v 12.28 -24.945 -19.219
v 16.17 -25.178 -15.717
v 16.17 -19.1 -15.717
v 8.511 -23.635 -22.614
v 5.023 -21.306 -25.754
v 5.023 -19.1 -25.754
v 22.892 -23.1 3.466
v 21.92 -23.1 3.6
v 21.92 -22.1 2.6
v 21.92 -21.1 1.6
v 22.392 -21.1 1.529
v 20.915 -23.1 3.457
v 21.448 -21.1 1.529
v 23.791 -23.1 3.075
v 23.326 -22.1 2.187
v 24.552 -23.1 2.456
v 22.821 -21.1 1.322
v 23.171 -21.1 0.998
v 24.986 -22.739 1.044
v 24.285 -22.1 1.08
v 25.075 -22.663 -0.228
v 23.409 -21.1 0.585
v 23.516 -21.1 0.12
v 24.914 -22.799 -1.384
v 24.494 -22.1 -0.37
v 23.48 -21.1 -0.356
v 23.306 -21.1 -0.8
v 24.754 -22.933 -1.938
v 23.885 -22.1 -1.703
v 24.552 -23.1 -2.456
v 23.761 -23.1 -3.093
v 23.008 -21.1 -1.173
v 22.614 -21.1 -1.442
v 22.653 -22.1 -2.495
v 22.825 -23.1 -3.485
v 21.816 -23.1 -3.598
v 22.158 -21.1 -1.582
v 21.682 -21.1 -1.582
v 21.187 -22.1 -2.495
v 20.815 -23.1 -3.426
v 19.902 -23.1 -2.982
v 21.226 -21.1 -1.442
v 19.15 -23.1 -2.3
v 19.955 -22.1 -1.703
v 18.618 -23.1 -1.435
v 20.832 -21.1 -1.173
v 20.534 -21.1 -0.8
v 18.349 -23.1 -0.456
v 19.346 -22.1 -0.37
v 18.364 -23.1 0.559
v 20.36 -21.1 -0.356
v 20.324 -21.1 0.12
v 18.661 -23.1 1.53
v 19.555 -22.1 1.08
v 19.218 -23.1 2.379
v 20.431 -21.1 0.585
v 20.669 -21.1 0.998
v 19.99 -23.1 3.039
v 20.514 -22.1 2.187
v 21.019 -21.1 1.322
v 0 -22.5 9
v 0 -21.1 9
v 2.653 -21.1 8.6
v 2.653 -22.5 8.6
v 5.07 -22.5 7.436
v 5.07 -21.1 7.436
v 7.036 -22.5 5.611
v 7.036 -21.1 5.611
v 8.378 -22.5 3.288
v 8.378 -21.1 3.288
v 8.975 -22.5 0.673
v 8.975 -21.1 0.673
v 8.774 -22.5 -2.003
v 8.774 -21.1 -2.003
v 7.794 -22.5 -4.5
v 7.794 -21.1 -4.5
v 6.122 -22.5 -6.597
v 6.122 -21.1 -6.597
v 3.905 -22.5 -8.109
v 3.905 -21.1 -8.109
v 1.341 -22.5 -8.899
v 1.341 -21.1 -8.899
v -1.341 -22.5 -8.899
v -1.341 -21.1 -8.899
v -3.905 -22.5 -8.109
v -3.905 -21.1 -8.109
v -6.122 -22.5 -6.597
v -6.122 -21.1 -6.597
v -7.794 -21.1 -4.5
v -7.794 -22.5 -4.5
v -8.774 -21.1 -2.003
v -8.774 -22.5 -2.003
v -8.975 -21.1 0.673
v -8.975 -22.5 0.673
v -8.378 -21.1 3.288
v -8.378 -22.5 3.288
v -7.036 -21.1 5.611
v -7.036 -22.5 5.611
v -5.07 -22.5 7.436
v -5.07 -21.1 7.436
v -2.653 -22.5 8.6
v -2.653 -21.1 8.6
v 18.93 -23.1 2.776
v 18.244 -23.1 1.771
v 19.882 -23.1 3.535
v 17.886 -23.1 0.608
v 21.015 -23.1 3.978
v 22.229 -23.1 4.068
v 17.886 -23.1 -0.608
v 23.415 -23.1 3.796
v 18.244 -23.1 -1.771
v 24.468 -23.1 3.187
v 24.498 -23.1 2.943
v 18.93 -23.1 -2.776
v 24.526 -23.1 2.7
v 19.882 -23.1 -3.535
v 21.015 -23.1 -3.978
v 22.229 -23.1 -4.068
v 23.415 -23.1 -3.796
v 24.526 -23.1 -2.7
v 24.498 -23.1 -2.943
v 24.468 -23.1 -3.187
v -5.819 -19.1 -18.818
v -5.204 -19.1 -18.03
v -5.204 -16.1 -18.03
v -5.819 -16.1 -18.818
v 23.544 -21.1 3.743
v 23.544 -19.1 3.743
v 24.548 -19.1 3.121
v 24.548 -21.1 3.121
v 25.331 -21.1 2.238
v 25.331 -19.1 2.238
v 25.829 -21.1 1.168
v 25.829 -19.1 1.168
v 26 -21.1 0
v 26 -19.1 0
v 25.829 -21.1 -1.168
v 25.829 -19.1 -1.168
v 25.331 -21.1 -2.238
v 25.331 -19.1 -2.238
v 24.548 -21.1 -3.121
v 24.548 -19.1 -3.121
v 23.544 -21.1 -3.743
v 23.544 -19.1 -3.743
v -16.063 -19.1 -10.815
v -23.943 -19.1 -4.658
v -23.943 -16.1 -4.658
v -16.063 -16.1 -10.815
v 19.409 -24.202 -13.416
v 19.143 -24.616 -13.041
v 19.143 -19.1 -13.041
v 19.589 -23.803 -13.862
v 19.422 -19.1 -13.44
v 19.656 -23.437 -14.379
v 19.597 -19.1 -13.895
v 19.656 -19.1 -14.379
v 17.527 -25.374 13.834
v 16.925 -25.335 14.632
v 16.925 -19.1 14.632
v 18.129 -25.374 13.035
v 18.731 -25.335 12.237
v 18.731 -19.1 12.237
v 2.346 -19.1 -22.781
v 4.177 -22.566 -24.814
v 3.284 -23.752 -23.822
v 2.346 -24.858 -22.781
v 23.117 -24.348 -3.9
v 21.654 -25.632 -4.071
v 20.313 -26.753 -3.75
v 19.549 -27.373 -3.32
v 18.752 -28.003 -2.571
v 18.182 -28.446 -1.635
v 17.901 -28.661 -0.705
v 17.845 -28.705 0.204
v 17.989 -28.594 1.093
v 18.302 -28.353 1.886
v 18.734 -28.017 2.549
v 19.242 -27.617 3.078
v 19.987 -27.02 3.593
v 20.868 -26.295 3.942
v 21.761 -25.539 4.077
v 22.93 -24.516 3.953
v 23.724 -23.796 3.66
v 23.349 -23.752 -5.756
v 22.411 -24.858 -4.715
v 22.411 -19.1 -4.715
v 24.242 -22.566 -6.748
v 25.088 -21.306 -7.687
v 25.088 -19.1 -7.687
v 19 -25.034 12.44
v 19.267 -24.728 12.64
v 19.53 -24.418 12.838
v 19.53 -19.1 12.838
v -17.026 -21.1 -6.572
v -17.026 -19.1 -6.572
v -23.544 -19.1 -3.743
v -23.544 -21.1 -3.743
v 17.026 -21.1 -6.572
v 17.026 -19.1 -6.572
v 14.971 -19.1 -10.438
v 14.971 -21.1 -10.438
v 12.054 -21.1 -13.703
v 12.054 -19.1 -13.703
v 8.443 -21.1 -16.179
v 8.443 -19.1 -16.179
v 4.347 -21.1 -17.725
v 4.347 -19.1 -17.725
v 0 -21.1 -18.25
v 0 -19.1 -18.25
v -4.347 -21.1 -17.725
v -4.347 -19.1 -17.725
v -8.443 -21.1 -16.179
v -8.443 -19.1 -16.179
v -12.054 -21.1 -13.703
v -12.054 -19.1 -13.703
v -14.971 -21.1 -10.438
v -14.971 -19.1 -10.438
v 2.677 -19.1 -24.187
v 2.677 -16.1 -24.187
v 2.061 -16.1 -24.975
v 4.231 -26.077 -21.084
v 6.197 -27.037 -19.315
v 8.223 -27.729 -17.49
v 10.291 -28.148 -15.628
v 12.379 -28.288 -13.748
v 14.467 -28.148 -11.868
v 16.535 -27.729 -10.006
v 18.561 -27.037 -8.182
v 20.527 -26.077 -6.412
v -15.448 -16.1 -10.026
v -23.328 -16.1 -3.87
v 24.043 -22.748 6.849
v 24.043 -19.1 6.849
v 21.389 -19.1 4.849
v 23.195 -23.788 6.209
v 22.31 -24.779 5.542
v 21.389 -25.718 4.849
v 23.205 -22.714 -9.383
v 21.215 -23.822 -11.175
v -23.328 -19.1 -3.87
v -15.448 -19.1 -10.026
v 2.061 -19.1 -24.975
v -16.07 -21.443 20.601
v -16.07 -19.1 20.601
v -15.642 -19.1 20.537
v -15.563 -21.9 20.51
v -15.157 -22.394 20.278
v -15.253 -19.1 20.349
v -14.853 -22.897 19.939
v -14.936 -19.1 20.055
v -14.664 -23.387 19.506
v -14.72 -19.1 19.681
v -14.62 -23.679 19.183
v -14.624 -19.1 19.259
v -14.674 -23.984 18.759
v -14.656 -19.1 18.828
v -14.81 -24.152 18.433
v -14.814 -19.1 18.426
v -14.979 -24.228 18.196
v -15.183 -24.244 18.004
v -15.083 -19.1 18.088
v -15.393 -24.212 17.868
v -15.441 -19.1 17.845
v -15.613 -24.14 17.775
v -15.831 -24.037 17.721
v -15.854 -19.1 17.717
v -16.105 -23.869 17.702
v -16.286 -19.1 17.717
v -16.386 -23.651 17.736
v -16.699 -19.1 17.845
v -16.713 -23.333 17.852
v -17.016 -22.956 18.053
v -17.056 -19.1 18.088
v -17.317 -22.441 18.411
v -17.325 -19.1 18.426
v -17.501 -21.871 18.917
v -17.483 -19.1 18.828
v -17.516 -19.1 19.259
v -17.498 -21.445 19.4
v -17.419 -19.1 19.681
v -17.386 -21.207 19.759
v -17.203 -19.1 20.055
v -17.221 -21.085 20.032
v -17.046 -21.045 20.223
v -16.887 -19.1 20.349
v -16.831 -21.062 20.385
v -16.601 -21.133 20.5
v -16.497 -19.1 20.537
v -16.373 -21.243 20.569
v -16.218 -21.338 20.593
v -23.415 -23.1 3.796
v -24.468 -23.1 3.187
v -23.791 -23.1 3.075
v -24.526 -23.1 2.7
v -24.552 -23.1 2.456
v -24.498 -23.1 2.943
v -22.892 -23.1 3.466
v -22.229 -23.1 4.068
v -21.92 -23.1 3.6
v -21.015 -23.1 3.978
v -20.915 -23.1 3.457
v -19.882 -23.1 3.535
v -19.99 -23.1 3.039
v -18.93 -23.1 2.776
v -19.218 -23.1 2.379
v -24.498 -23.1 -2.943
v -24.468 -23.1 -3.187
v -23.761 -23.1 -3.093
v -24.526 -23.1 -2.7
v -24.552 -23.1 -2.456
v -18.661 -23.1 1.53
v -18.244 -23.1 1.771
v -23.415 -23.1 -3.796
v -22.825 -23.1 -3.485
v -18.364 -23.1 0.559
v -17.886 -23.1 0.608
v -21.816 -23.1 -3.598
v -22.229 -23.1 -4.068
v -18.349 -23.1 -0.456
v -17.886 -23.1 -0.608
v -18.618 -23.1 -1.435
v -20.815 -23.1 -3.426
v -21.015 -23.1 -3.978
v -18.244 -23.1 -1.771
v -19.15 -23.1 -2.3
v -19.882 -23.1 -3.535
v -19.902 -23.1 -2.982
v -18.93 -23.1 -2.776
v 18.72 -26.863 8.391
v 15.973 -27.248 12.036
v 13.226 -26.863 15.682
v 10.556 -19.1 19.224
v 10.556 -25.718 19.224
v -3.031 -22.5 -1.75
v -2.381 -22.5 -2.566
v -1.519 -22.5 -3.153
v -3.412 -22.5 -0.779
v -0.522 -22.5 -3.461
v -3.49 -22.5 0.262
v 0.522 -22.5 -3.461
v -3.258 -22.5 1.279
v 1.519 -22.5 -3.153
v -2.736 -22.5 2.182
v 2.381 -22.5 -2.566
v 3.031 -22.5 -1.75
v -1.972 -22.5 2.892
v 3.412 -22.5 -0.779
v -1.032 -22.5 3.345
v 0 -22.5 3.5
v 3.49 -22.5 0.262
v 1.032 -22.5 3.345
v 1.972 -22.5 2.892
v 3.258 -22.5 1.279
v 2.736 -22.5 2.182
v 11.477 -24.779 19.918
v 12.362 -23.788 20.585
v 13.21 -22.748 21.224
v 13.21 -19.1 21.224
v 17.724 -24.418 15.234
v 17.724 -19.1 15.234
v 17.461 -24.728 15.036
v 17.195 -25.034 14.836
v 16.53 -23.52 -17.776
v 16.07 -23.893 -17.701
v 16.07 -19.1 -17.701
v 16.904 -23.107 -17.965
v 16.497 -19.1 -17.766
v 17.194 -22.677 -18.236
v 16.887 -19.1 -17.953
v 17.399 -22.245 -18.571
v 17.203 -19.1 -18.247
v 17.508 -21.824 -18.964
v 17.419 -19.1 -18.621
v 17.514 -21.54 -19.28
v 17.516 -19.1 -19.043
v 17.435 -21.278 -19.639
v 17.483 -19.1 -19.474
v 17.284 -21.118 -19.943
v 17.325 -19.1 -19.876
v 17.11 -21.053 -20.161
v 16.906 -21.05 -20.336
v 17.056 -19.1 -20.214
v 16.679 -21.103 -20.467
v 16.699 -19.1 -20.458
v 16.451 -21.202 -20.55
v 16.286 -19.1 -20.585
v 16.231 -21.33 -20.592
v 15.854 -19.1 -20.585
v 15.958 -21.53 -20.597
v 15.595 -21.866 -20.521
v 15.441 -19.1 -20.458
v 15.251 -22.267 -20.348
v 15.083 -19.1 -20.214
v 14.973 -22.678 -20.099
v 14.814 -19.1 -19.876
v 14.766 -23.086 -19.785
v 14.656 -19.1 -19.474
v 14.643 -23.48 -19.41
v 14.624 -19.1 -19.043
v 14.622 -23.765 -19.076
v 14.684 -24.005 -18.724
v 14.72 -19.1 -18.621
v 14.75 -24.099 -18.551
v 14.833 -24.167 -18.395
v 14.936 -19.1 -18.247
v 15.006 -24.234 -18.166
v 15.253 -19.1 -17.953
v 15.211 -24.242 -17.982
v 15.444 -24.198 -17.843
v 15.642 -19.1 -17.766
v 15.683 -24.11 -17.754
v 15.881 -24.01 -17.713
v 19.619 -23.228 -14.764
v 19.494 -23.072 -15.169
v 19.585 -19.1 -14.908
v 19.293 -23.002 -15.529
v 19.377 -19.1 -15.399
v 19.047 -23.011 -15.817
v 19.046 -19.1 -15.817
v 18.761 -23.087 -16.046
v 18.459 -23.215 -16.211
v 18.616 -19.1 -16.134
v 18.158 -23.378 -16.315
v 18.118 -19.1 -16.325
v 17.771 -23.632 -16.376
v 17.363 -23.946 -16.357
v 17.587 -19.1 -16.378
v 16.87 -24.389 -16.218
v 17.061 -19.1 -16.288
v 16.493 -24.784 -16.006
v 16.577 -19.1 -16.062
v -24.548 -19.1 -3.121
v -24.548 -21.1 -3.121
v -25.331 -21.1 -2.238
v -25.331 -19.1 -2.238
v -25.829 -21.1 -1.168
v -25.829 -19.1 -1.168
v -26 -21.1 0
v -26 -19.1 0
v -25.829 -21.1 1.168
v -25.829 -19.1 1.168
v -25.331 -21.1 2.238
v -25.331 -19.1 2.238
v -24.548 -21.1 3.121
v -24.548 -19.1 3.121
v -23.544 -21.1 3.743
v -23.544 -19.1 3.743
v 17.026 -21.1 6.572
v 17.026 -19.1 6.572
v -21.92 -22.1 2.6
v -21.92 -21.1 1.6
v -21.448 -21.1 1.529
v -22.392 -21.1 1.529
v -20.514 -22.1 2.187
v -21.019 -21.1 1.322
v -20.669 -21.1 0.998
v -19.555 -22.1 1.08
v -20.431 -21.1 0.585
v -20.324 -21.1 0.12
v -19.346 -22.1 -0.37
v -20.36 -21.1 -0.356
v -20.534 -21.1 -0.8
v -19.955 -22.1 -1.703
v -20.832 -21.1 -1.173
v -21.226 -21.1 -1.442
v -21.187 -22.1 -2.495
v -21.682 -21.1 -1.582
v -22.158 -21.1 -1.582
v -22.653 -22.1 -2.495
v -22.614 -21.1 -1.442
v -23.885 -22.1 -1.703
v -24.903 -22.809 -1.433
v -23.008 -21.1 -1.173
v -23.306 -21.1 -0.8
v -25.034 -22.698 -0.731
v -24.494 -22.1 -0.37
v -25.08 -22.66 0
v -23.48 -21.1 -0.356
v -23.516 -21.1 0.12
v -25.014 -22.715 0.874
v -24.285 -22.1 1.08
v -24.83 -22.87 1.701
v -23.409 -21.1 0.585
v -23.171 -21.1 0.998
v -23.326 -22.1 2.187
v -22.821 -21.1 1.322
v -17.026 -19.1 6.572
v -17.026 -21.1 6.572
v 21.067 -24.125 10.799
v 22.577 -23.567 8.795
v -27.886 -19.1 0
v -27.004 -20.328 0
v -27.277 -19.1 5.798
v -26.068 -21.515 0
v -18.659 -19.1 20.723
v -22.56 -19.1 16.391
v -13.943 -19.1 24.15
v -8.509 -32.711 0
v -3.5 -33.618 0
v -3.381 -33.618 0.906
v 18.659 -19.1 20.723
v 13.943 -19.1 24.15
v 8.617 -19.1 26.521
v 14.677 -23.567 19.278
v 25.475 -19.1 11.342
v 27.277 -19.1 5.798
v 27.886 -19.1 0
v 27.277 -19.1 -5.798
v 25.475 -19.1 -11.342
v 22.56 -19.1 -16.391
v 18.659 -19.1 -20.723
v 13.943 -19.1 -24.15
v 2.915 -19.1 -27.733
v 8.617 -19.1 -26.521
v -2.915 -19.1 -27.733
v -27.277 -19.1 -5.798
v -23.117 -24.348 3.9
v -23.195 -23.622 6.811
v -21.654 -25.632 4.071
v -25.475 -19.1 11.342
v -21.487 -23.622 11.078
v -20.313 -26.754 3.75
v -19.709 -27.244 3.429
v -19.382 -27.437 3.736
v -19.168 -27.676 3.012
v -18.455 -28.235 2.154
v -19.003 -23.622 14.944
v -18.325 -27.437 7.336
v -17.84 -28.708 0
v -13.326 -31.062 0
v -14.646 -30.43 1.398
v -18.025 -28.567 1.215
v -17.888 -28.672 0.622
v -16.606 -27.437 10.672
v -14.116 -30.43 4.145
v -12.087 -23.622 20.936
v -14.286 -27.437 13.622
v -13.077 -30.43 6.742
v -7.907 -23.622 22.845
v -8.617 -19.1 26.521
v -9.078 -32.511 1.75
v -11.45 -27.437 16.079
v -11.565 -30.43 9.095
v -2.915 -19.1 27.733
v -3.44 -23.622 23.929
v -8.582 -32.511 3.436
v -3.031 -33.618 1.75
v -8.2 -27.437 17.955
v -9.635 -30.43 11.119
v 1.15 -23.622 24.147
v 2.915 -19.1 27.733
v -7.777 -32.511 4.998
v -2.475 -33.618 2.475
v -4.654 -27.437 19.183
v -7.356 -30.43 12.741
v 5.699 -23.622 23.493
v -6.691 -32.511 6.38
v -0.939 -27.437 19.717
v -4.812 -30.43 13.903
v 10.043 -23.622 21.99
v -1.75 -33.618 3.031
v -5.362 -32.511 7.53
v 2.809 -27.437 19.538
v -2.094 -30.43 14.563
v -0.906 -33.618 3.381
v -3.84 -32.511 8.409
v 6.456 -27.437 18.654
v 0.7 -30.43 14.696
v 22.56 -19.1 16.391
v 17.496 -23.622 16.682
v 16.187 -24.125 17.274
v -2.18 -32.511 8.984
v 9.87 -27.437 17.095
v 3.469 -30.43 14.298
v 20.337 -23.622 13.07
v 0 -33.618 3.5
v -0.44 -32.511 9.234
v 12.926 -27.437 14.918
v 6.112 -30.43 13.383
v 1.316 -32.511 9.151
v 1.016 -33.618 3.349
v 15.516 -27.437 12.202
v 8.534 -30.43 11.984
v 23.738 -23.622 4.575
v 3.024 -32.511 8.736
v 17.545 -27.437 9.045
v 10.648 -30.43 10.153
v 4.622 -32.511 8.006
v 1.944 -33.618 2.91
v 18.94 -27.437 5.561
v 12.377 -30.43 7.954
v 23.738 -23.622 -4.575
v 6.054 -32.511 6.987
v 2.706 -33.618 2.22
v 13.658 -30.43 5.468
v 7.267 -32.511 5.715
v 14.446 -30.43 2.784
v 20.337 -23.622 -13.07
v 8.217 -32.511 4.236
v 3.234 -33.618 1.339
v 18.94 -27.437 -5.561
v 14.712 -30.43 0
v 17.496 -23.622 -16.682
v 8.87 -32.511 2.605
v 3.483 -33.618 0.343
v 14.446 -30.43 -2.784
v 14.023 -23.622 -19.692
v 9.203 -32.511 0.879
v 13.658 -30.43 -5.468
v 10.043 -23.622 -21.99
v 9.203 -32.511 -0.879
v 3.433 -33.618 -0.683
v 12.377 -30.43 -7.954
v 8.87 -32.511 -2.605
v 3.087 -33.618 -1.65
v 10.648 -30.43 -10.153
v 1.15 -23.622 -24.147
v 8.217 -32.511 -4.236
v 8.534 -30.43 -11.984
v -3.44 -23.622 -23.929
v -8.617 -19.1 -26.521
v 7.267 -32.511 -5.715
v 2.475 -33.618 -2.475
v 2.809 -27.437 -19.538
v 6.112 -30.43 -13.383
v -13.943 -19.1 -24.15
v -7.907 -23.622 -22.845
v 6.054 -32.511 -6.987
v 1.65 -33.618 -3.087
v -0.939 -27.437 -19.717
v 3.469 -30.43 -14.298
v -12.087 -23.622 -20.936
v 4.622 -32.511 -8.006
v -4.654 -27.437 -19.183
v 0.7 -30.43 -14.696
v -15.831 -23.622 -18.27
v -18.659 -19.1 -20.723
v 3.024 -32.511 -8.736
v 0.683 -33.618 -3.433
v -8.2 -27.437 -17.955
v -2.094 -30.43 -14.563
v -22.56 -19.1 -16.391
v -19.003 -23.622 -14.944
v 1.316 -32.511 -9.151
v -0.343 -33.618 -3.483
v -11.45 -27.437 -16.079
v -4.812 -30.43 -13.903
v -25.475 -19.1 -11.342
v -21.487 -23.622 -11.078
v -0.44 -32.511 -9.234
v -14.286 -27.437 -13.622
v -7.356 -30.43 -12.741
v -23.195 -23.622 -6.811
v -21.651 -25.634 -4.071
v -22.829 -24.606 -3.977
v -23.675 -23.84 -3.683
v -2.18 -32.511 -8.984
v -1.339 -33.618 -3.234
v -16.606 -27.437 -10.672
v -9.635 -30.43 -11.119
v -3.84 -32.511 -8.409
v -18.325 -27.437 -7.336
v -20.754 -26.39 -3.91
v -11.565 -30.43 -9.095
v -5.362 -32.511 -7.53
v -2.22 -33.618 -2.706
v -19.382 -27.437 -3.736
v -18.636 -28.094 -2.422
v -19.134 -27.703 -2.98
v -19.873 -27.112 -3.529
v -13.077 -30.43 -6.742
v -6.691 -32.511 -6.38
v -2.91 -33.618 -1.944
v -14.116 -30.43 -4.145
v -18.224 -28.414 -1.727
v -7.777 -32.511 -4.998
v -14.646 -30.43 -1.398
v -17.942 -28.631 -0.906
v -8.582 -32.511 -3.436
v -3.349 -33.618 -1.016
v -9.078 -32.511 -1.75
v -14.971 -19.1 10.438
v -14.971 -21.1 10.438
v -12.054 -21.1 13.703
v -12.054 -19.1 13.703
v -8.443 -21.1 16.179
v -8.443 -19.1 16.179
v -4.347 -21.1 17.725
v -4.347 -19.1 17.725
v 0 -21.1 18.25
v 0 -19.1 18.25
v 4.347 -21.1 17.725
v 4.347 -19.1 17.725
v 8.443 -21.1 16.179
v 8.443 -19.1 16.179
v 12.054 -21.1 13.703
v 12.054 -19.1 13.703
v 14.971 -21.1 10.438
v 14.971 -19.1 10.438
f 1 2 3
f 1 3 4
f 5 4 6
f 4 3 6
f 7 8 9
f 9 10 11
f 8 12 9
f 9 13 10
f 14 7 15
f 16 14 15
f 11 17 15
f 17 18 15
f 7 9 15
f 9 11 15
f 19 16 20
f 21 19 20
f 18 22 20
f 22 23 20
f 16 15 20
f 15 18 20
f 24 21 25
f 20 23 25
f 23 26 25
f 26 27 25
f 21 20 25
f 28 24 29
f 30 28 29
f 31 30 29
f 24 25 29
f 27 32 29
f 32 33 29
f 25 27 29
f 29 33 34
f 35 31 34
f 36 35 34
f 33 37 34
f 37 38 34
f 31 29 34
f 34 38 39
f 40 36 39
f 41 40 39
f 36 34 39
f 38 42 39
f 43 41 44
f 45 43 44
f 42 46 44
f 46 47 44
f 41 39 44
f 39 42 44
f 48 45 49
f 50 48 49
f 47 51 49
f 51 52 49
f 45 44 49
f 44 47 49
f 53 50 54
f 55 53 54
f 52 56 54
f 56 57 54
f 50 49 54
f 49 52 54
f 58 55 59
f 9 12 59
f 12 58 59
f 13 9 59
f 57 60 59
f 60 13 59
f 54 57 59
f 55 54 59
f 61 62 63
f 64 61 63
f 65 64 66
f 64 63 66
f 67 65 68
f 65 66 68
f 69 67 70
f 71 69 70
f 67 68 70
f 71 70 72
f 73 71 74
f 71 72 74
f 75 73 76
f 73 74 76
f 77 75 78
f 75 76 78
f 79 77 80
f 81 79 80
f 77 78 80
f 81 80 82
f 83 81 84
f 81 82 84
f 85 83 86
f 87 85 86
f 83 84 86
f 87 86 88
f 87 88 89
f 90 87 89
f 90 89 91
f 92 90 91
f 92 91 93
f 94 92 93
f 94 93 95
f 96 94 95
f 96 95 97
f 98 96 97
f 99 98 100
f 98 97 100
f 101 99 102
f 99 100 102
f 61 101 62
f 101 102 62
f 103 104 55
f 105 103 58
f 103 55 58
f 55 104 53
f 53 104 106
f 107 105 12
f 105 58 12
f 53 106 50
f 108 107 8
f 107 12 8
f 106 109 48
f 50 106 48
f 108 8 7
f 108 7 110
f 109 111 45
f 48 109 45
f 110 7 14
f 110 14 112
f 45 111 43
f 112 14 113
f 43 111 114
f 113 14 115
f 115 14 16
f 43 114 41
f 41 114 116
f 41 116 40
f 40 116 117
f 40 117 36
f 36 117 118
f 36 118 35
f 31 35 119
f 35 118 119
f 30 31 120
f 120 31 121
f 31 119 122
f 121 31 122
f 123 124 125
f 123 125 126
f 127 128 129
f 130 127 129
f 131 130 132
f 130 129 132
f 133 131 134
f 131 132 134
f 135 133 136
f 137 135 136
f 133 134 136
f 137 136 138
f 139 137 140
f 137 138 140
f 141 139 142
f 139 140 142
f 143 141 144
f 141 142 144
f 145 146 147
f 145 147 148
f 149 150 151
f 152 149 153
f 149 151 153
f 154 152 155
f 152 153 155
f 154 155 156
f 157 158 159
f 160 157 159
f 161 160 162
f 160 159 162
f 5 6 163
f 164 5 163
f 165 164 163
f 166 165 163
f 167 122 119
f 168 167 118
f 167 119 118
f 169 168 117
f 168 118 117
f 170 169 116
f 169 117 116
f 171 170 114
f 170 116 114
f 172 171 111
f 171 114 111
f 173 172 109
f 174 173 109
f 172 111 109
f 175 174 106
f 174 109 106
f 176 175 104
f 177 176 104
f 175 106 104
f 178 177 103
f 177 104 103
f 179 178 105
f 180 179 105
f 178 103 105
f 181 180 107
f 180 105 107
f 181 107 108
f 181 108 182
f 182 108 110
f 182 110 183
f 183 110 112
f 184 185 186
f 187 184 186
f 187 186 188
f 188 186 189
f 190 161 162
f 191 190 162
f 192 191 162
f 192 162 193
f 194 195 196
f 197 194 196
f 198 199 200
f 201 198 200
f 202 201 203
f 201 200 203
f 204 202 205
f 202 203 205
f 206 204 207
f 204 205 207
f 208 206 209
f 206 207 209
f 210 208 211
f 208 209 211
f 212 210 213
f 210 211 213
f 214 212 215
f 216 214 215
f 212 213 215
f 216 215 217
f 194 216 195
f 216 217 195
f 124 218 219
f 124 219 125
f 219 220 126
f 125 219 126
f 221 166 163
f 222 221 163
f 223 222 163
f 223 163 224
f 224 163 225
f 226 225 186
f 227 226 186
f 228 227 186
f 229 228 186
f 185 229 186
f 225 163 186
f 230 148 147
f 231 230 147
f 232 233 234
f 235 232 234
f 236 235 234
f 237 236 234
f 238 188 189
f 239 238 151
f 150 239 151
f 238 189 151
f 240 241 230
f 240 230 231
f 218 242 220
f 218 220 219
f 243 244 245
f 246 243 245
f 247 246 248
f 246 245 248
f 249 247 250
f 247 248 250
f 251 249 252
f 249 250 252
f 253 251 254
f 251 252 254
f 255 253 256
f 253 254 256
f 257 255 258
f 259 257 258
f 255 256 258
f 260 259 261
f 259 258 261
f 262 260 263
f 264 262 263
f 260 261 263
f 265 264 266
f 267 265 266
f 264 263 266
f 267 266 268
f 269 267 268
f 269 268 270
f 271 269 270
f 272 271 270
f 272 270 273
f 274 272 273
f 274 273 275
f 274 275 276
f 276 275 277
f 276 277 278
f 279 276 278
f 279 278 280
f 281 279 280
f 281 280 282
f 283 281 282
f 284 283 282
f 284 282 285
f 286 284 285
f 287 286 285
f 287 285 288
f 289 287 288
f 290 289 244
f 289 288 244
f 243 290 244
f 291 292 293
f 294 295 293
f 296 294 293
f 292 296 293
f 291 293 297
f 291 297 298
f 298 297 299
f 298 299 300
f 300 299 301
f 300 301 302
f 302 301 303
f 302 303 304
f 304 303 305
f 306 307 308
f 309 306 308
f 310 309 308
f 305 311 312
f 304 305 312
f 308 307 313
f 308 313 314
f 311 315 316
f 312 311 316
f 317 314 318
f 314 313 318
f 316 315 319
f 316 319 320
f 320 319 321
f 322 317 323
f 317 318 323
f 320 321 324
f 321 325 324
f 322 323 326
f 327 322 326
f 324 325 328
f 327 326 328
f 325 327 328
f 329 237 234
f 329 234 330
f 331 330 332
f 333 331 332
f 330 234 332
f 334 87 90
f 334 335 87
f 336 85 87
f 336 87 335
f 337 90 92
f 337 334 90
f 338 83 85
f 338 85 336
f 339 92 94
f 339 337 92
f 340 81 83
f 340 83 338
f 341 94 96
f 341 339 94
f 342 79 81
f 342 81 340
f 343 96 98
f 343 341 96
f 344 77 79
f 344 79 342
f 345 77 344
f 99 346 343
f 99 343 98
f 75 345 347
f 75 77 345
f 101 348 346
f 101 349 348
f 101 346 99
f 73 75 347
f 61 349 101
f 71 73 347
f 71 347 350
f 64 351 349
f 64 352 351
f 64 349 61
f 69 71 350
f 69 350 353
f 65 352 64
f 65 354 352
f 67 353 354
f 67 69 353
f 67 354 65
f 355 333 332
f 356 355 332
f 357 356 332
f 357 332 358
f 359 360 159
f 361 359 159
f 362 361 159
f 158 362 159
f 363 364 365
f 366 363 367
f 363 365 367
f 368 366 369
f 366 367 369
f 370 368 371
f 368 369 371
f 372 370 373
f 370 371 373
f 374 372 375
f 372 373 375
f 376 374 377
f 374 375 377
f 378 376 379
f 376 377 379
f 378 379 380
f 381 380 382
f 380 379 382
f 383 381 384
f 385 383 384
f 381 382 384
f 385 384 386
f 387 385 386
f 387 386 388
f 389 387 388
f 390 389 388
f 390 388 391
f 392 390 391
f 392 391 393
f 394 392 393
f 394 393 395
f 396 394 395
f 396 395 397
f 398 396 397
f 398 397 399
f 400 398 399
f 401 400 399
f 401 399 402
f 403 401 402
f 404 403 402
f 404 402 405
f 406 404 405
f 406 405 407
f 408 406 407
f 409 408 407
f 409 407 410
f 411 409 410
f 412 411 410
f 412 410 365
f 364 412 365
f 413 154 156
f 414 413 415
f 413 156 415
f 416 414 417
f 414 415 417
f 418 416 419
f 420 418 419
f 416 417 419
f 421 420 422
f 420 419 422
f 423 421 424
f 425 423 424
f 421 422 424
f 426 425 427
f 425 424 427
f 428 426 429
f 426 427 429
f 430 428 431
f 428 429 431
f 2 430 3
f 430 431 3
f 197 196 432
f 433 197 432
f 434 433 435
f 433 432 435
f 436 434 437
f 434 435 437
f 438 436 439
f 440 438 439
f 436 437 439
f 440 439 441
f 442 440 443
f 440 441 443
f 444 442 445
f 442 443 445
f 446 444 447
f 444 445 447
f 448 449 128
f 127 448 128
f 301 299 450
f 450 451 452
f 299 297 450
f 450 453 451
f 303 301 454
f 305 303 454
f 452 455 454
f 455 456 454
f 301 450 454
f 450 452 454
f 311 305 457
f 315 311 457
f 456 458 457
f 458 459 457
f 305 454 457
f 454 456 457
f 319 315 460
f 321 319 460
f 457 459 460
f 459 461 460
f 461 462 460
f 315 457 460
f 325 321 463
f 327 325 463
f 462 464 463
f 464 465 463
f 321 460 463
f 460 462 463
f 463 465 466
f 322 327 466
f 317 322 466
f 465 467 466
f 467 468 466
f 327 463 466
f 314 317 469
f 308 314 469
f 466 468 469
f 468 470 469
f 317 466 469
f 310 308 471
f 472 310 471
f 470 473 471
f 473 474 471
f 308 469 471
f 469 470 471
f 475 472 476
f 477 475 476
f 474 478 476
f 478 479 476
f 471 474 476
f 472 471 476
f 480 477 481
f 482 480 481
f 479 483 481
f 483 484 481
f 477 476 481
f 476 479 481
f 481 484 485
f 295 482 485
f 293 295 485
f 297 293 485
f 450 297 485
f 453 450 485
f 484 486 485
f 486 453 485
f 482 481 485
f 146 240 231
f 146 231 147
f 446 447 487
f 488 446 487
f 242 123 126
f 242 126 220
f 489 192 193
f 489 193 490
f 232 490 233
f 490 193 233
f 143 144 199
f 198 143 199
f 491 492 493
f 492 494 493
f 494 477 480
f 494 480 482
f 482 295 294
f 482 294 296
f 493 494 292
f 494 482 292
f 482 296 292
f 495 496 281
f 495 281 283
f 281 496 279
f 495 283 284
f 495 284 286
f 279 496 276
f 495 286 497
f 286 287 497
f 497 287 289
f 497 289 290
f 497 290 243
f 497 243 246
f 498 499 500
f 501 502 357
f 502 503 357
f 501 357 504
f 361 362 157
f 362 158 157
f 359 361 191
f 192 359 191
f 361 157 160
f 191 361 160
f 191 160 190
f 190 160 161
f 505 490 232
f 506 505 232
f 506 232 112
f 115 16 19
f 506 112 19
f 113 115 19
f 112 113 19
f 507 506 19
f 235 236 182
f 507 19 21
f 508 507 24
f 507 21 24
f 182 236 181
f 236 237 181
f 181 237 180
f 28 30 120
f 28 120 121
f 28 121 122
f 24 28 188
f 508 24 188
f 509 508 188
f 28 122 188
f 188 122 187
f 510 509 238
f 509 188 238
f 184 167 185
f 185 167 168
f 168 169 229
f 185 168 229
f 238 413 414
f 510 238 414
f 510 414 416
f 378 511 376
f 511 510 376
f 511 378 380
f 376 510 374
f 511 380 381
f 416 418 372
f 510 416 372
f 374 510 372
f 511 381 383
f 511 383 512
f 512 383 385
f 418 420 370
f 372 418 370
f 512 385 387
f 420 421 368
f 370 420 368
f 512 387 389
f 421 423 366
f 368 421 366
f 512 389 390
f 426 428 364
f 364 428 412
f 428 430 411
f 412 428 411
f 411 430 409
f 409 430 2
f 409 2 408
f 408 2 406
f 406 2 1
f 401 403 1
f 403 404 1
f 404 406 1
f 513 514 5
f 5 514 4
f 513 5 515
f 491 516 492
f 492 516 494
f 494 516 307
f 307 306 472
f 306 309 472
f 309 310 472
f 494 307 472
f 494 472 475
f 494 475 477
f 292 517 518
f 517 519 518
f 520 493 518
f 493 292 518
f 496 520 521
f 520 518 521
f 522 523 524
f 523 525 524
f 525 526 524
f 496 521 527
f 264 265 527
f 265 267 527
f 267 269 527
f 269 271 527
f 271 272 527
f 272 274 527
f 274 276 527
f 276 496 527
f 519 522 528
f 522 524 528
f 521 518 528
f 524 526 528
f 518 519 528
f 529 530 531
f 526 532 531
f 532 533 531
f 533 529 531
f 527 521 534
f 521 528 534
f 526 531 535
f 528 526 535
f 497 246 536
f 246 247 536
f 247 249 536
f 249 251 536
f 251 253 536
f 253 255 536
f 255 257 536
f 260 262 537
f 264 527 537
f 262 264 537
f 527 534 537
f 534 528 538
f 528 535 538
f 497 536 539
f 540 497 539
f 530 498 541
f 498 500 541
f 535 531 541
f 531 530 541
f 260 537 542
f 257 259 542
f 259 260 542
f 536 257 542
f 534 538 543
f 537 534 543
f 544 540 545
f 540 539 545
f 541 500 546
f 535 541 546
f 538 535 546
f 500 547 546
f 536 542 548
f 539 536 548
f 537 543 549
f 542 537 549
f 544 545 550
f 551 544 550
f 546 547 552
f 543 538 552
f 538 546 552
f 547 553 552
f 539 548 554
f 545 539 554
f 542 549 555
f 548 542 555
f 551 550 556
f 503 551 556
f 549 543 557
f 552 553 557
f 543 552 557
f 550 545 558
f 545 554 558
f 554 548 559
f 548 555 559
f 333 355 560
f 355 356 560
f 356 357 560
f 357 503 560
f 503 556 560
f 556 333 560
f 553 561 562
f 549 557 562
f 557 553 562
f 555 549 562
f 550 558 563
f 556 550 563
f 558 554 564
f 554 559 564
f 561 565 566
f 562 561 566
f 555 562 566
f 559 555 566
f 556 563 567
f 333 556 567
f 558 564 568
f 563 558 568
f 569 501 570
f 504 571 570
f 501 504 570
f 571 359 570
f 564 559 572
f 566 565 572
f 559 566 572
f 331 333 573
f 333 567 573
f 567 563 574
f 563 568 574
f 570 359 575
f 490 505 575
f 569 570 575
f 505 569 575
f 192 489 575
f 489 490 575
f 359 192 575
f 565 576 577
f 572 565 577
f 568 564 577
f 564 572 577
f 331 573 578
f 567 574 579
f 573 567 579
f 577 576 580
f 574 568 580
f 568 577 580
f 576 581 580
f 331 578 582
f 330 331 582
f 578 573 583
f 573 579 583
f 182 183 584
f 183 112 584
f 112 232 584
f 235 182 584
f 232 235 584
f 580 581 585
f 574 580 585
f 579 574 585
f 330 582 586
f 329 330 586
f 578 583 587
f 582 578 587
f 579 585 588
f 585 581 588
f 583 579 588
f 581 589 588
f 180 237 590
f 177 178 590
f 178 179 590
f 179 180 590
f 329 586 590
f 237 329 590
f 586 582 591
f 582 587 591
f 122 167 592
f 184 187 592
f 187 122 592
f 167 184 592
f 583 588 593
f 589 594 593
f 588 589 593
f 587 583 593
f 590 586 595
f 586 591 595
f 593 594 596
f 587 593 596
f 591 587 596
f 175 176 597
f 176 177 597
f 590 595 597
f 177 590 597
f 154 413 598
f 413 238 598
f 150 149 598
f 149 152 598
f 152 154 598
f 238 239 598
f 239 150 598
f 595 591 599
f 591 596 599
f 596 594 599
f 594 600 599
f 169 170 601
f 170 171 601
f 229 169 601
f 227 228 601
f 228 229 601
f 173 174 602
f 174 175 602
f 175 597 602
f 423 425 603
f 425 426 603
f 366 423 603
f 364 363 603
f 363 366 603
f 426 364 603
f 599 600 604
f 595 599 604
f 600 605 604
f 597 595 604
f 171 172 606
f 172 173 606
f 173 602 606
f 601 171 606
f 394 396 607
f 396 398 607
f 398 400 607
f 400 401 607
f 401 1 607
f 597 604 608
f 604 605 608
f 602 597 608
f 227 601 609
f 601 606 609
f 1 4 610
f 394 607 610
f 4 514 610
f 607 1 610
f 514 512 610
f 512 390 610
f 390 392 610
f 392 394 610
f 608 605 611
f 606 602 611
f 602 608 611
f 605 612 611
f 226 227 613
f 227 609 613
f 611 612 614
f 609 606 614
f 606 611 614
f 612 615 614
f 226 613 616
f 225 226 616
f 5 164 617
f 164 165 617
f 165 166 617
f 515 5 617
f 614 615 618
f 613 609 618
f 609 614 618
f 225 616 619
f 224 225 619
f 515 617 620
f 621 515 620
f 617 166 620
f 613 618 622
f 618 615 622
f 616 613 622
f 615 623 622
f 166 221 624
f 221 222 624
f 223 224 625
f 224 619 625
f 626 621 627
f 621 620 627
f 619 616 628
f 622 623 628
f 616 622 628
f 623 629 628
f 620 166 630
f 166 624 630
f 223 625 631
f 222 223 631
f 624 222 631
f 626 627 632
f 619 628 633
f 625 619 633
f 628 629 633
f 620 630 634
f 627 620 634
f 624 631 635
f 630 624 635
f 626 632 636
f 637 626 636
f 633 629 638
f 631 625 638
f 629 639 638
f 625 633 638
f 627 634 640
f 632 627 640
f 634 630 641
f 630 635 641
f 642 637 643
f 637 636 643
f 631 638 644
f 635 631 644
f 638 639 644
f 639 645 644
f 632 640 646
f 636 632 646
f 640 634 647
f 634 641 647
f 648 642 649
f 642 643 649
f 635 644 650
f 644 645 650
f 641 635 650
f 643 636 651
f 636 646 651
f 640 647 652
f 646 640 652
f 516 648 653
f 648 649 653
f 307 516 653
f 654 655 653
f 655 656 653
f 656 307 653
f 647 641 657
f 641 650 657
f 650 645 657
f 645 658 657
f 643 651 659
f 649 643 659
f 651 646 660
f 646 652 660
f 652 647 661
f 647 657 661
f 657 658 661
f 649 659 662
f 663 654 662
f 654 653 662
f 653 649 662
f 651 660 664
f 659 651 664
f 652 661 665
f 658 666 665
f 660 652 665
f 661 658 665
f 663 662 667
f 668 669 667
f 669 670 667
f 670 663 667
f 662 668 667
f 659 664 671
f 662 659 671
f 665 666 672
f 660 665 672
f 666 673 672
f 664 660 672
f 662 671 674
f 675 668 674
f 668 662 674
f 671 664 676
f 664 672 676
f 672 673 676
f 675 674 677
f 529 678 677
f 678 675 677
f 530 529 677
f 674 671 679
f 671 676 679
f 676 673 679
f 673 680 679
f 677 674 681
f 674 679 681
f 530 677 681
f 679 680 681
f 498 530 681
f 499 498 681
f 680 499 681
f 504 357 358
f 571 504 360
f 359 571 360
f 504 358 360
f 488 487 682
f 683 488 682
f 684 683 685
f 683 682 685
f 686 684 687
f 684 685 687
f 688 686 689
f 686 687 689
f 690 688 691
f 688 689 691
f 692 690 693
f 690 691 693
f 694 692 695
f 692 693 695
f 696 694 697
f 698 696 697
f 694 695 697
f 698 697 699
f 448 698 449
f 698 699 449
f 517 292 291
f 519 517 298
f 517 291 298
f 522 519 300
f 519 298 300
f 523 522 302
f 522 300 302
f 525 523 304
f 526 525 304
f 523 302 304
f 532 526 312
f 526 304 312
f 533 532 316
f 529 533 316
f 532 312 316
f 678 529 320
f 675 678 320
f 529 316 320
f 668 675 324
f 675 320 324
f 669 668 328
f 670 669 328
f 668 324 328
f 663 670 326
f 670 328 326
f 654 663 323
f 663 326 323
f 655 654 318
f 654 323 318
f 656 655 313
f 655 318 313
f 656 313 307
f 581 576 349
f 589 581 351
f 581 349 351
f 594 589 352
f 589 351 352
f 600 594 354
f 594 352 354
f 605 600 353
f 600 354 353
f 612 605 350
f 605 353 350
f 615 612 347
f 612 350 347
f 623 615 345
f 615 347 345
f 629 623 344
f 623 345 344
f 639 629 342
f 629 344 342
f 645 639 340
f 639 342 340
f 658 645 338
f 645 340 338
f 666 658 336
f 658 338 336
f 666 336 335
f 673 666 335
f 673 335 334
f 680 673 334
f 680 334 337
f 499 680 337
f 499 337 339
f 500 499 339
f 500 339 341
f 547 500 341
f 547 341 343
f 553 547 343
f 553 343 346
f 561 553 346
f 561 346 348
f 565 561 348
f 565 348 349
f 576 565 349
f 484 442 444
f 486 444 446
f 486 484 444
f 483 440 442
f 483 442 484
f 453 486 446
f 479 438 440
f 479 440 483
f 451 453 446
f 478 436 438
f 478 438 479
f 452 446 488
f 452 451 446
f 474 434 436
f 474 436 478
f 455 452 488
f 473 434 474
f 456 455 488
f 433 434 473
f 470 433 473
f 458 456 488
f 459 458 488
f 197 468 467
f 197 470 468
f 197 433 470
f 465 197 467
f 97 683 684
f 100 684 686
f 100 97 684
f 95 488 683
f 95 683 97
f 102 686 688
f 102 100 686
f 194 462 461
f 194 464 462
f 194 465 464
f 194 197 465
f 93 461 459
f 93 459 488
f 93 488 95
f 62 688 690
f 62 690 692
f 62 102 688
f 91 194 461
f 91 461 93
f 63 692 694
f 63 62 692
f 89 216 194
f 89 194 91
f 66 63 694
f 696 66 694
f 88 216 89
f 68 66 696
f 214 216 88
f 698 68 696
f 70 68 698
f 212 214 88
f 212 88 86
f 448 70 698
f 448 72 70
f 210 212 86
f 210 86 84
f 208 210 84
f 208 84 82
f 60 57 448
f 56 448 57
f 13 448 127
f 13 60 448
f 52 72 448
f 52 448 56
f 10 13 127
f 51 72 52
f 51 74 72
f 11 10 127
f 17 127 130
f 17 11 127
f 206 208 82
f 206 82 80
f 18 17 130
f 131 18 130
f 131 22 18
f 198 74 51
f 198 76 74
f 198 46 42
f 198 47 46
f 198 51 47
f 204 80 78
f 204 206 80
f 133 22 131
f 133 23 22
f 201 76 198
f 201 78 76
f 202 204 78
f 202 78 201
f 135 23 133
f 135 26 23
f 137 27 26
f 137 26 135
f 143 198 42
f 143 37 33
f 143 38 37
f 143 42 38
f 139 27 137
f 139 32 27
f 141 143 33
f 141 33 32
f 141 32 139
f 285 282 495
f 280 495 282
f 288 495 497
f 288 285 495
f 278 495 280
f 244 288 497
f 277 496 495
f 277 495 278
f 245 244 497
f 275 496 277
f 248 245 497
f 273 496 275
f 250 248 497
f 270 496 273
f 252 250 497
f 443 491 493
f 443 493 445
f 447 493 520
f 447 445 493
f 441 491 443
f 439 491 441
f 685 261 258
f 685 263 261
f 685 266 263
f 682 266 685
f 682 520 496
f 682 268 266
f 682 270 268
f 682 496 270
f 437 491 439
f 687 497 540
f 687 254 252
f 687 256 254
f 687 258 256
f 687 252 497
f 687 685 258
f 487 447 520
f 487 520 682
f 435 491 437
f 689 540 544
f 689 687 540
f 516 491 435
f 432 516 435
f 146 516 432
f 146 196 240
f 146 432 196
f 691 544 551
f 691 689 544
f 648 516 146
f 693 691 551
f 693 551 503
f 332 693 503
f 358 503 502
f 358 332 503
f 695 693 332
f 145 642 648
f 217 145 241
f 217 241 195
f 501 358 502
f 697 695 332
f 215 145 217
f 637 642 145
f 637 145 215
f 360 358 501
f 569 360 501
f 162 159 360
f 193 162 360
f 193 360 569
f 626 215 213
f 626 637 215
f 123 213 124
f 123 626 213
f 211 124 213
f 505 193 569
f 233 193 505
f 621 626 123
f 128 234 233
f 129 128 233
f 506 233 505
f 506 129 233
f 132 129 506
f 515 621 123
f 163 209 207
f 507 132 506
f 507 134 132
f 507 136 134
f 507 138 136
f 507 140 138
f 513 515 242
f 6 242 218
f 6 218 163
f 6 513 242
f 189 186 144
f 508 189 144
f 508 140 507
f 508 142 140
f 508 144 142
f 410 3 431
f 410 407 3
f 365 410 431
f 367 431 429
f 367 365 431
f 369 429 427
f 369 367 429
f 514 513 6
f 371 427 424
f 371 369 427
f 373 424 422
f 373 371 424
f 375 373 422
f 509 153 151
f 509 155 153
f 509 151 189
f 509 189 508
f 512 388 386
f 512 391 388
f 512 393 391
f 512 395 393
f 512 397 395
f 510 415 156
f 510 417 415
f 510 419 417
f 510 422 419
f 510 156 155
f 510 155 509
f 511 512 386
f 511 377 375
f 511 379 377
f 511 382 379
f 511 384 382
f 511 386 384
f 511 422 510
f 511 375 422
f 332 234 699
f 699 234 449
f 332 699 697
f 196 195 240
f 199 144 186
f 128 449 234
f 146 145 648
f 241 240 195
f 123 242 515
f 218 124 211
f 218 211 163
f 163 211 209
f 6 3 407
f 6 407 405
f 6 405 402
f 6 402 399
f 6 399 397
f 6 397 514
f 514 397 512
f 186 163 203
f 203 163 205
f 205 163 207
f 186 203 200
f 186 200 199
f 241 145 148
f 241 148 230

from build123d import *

# Parameters (mm, degrees)
SKETCH2_R               = 33.8
CUT_EXTRUDE1_DEPTH      = 19.1
CUT_EXTRUDE2_START      = -19.1
CUT_EXTRUDE2_DEPTH      = 2
CUT_EXTRUDE3_REACH      = 43.431
CUT_EXTRUDE3_END_RADIUS = 33.8
SKETCH6_R               = 1.6
CUT_EXTRUDE4_REACH      = 45.431
CUT_EXTRUDE4_START      = -2
SKETCH7_R               = 4.08
SKETCH8_R               = 9
CUT_EXTRUDE5_DEPTH      = 1.4
CUT_EXTRUDE6_REACH      = 43.024
CUT_EXTRUDE6_END_RADIUS = 33.8
SKETCH9_R               = 3.5
CUT_EXTRUDE8_REACH      = 44.024
CUT_EXTRUDE8_END_RADIUS = 33.8
SKETCH11_R              = 2
CUT_EXTRUDE9_REACH      = 44.024
CUT_EXTRUDE9_END_RADIUS = 33.8
CUT_EXTRUDE7_REACH      = 44.024
CUT_EXTRUDE7_END_RADIUS = 33.8
SKETCH10_R              = 1.45
BOSS_EXTRUDE1_DEPTH     = 3
CHAMFER1_SIZE           = 2


with BuildPart() as part:
    # Sketch1 → Revolve1 (revolve)
    with BuildSketch(Plane.XY, mode=Mode.PRIVATE) as revolve1_sk:
        with BuildLine():
            Line((0, -33.8), (0, 0))
            Line((0, 0), (33.8, 0))
            ThreePointArc((33.8, 0), (23.900209204, -23.900209204), (0, -33.8))
        make_face()
    revolve(revolve1_sk.sketch.rotate(Axis((0, -33.8, 0), (0, 1, 0)), 180), axis=Axis((0, -33.8, 0), (0, 1, 0)))

    # Sketch2 → Cut-Extrude1 (cut)
    with BuildSketch(Plane(origin=(0, 0, 0), x_dir=(1, 0, 0), z_dir=(0, 1, 0))):
        Circle(SKETCH2_R)
    extrude(amount=-CUT_EXTRUDE1_DEPTH, mode=Mode.SUBTRACT)

    # Sketch5 → Cut-Extrude2 (cut)
    with BuildSketch(Plane(origin=(0, 0, 0), x_dir=(1, 0, 0), z_dir=(0, 1, 0)).offset(CUT_EXTRUDE2_START)):
        with BuildLine():
            Line((-17.025732229, 6.571677263), (-23.544283672, 3.742739979))
            ThreePointArc((-23.544283672, 3.742739979), (-26, 0), (-23.544283672, -3.742739979))
            Line((-23.544283672, -3.742739979), (-17.025732229, -6.571677263))
            ThreePointArc((-17.025732229, -6.571677263), (0, -18.25), (17.025732229, -6.571677263))
            Line((17.025732229, -6.571677263), (23.544283672, -3.742739979))
            ThreePointArc((23.544283672, -3.742739979), (26, 0), (23.544283672, 3.742739979))
            Line((23.544283672, 3.742739979), (17.025732229, 6.571677263))
            ThreePointArc((17.025732229, 6.571677263), (0, 18.25), (-17.025732229, 6.571677263))
        make_face()
    extrude(amount=-CUT_EXTRUDE2_DEPTH, mode=Mode.SUBTRACT)

    # Cut-Extrude3: up to this sphere (the profile starts inside it)
    cut_extrude3_end = Location((0, 0, 0)) * Sphere(CUT_EXTRUDE3_END_RADIUS, mode=Mode.PRIVATE)
    # Sketch6 → Cut-Extrude3 (cut, up to the surface)
    with BuildSketch(Plane(origin=(0, -21.1, 0), x_dir=(1, 0, 0), z_dir=(0, 1, 0)), mode=Mode.PRIVATE) as cut_extrude3_sk1:
        with Locations(Location((-21.92, 0, 0), (0, 0, 270))):
            Circle(SKETCH6_R)
    cut_extrude3_tool1 = extrude(cut_extrude3_sk1.sketch, amount=-CUT_EXTRUDE3_REACH, mode=Mode.PRIVATE) & cut_extrude3_end
    add(cut_extrude3_tool1.solids().sort_by_distance((-21.92, -21.1, 0))[0], mode=Mode.SUBTRACT)
    # Sketch6 → Cut-Extrude3 (cut, up to the surface)
    with BuildSketch(Plane(origin=(0, -21.1, 0), x_dir=(1, 0, 0), z_dir=(0, 1, 0)), mode=Mode.PRIVATE) as cut_extrude3_sk2:
        with Locations(Location((21.92, 0, 0), (0, 0, 270))):
            Circle(SKETCH6_R)
    cut_extrude3_tool2 = extrude(cut_extrude3_sk2.sketch, amount=-CUT_EXTRUDE3_REACH, mode=Mode.PRIVATE) & cut_extrude3_end
    add(cut_extrude3_tool2.solids().sort_by_distance((21.92, -21.1, 0))[0], mode=Mode.SUBTRACT)

    # Sketch7 → Cut-Extrude4 (cut, up to next)
    with BuildSketch(Plane(origin=(0, -21.1, 0), x_dir=(1, 0, 0), z_dir=(0, 1, 0)).offset(CUT_EXTRUDE4_START), mode=Mode.PRIVATE) as cut_extrude4_sk1:
        with Locations((-21.92, 0)):
            Circle(SKETCH7_R)
    cut_extrude4_tool1 = extrude(cut_extrude4_sk1.sketch, amount=-CUT_EXTRUDE4_REACH, mode=Mode.PRIVATE) & part.part
    # Sketch7 → Cut-Extrude4 (cut, up to next)
    with BuildSketch(Plane(origin=(0, -21.1, 0), x_dir=(1, 0, 0), z_dir=(0, 1, 0)).offset(CUT_EXTRUDE4_START), mode=Mode.PRIVATE) as cut_extrude4_sk2:
        with Locations((21.92, 0)):
            Circle(SKETCH7_R)
    cut_extrude4_tool2 = extrude(cut_extrude4_sk2.sketch, amount=-CUT_EXTRUDE4_REACH, mode=Mode.PRIVATE) & part.part
    add(cut_extrude4_tool1.solids().sort_by_distance((-21.92, -23.1, 0))[0], mode=Mode.SUBTRACT)
    add(cut_extrude4_tool2.solids().sort_by_distance((21.92, -23.1, 0))[0], mode=Mode.SUBTRACT)

    # Sketch8 → Cut-Extrude5 (cut)
    with BuildSketch(Plane(origin=(0, -21.1, 0), x_dir=(1, 0, 0), z_dir=(0, 1, 0))):
        with Locations(Location((0, 0, 0), (0, 0, 270))):
            Circle(SKETCH8_R)
    extrude(amount=-CUT_EXTRUDE5_DEPTH, mode=Mode.SUBTRACT)

    # Cut-Extrude6: up to this sphere (the profile starts inside it)
    cut_extrude6_end = Location((0, 0, 0)) * Sphere(CUT_EXTRUDE6_END_RADIUS, mode=Mode.PRIVATE)
    # Sketch9 → Cut-Extrude6 (cut, up to the surface)
    with BuildSketch(Plane(origin=(0, -22.5, 0), x_dir=(1, 0, 0), z_dir=(0, 1, 0)), mode=Mode.PRIVATE) as cut_extrude6_sk1:
        with Locations(Location((0, 0, 0), (0, 0, 270))):
            Circle(SKETCH9_R)
    cut_extrude6_tool1 = extrude(cut_extrude6_sk1.sketch, amount=-CUT_EXTRUDE6_REACH, mode=Mode.PRIVATE) & cut_extrude6_end
    add(cut_extrude6_tool1.solids().sort_by_distance((0, -22.5, 0))[0], mode=Mode.SUBTRACT)

    # Cut-Extrude8: up to this sphere (the profile starts inside it)
    cut_extrude8_end = Location((0, 0, 0)) * Sphere(CUT_EXTRUDE8_END_RADIUS, mode=Mode.PRIVATE)
    # Sketch11 → Cut-Extrude8 (cut, up to the surface)
    with BuildSketch(Plane(origin=(0, -19.1, 0), x_dir=(1, 0, 0), z_dir=(0, 1, 0)), mode=Mode.PRIVATE) as cut_extrude8_sk1:
        with BuildLine():
            ThreePointArc((16.170155881, 15.717062664), (16.31818432, 12.8925118), (19.142735183, 13.040540238))
            Line((19.142735183, 13.040540238), (16.170155881, 15.717062664))
        make_face()
    cut_extrude8_tool1 = extrude(cut_extrude8_sk1.sketch, amount=-CUT_EXTRUDE8_REACH, mode=Mode.PRIVATE) & cut_extrude8_end
    add(cut_extrude8_tool1.solids().sort_by_distance((17.08847, -19.1, -13.748001))[0], mode=Mode.SUBTRACT)
    # Sketch11 → Cut-Extrude8 (cut, up to the surface)
    with BuildSketch(Plane(origin=(0, -19.1, 0), x_dir=(1, 0, 0), z_dir=(0, 1, 0)), mode=Mode.PRIVATE) as cut_extrude8_sk2:
        with BuildLine():
            Line((16.170155881, 15.717062664), (19.142735183, 13.040540238))
            ThreePointArc((19.142735183, 13.040540238), (19.523606385, 13.662065552), (19.656445532, 14.378801451))
            ThreePointArc((19.656445532, 14.378801451), (18.373181431, 16.245962304), (16.170155881, 15.717062664))
        make_face()
    cut_extrude8_tool2 = extrude(cut_extrude8_sk2.sketch, amount=-CUT_EXTRUDE8_REACH, mode=Mode.PRIVATE) & cut_extrude8_end
    add(cut_extrude8_tool2.solids().sort_by_distance((18.224421, -19.1, -15.009602))[0], mode=Mode.SUBTRACT)
    # Sketch11 → Cut-Extrude8 (cut, up to the surface)
    with BuildSketch(Plane(origin=(0, -19.1, 0), x_dir=(1, 0, 0), z_dir=(0, 1, 0)), mode=Mode.PRIVATE) as cut_extrude8_sk3:
        with Locations((17.656445532, 14.378801451)):
            Circle(SKETCH11_R)
    cut_extrude8_tool3 = extrude(cut_extrude8_sk3.sketch, amount=-CUT_EXTRUDE8_REACH, mode=Mode.PRIVATE) & cut_extrude8_end
    add(cut_extrude8_tool3.solids().sort_by_distance((17.656446, -19.1, -14.378801))[0], mode=Mode.SUBTRACT)
    # Sketch11 → Cut-Extrude8 (cut, up to the surface)
    with BuildSketch(Plane(origin=(0, -19.1, 0), x_dir=(1, 0, 0), z_dir=(0, 1, 0)), mode=Mode.PRIVATE) as cut_extrude8_sk4:
        Polygon((25.087893787, 7.687495387), (5.022983499, 25.754021759), (2.346461074, 22.781442457), (22.411371362, 4.714916085), align=None)
    cut_extrude8_tool4 = extrude(cut_extrude8_sk4.sketch, amount=-CUT_EXTRUDE8_REACH, mode=Mode.PRIVATE) & cut_extrude8_end
    add(cut_extrude8_tool4.solids().sort_by_distance((13.717177, -19.1, -15.234469))[0], mode=Mode.SUBTRACT)
    # Sketch11 → Cut-Extrude8 (cut, up to the surface)
    with BuildSketch(Plane(origin=(0, -19.1, 0), x_dir=(1, 0, 0), z_dir=(0, 1, 0)), mode=Mode.PRIVATE) as cut_extrude8_sk5:
        with BuildLine():
            ThreePointArc((16.170155881, 15.717062664), (16.31818432, 12.8925118), (19.142735183, 13.040540238))
            Line((19.142735183, 13.040540238), (16.170155881, 15.717062664))
        make_face()
    cut_extrude8_tool5 = extrude(cut_extrude8_sk5.sketch, amount=-CUT_EXTRUDE8_REACH, mode=Mode.PRIVATE) & cut_extrude8_end
    add(cut_extrude8_tool5.solids().sort_by_distance((17.08847, -19.1, -13.748001))[0], mode=Mode.SUBTRACT)
    # Sketch11 → Cut-Extrude8 (cut, up to the surface)
    with BuildSketch(Plane(origin=(0, -19.1, 0), x_dir=(1, 0, 0), z_dir=(0, 1, 0)), mode=Mode.PRIVATE) as cut_extrude8_sk6:
        with BuildLine():
            Line((16.170155881, 15.717062664), (19.142735183, 13.040540238))
            ThreePointArc((19.142735183, 13.040540238), (19.523606385, 13.662065552), (19.656445532, 14.378801451))
            ThreePointArc((19.656445532, 14.378801451), (18.373181431, 16.245962304), (16.170155881, 15.717062664))
        make_face()
    cut_extrude8_tool6 = extrude(cut_extrude8_sk6.sketch, amount=-CUT_EXTRUDE8_REACH, mode=Mode.PRIVATE) & cut_extrude8_end
    add(cut_extrude8_tool6.solids().sort_by_distance((18.224421, -19.1, -15.009602))[0], mode=Mode.SUBTRACT)

    # Cut-Extrude9: up to this sphere (the profile starts inside it)
    cut_extrude9_end = Location((0, 0, 0)) * Sphere(CUT_EXTRUDE9_END_RADIUS, mode=Mode.PRIVATE)
    # Sketch13 → Cut-Extrude9 (cut, up to the surface)
    with BuildSketch(Plane(origin=(0, -19.1, 0), x_dir=(1, 0, 0), z_dir=(0, 1, 0)), mode=Mode.PRIVATE) as cut_extrude9_sk1:
        Polygon((10.556374993, -19.224020053), (13.210464636, -21.224020053), (17.724077309, -15.234253728), (16.925441799, -14.632438705), (18.730886869, -12.236532175), (19.529522379, -12.838347198), (24.043135053, -6.848580873), (21.389045409, -4.848580873), align=None)
    cut_extrude9_tool1 = extrude(cut_extrude9_sk1.sketch, amount=-CUT_EXTRUDE9_REACH, mode=Mode.PRIVATE) & cut_extrude9_end
    add(cut_extrude9_tool1.solids().sort_by_distance((17.250772, -19.1, 12.999389))[0], mode=Mode.SUBTRACT)

    # Cut-Extrude7: up to this sphere (the profile starts inside it)
    cut_extrude7_end = Location((0, 0, 0)) * Sphere(CUT_EXTRUDE7_END_RADIUS, mode=Mode.PRIVATE)
    # Sketch10 → Cut-Extrude7 (cut, up to the surface)
    with BuildSketch(Plane(origin=(0, -19.1, 0), x_dir=(1, 0, 0), z_dir=(0, 1, 0)), mode=Mode.PRIVATE) as cut_extrude7_sk1:
        with Locations(Location((-16.069690242, -19.151111078, 0), (0, 0, 270))):
            Circle(SKETCH10_R)
    cut_extrude7_tool1 = extrude(cut_extrude7_sk1.sketch, amount=-CUT_EXTRUDE7_REACH, mode=Mode.PRIVATE) & cut_extrude7_end
    add(cut_extrude7_tool1.solids().sort_by_distance((-16.06969, -19.1, 19.151111))[0], mode=Mode.SUBTRACT)
    # Sketch10 → Cut-Extrude7 (cut, up to the surface)
    with BuildSketch(Plane(origin=(0, -19.1, 0), x_dir=(1, 0, 0), z_dir=(0, 1, 0)), mode=Mode.PRIVATE) as cut_extrude7_sk2:
        with Locations(Location((16.069690242, 19.151111078, 0), (0, 0, 270))):
            Circle(SKETCH10_R)
    cut_extrude7_tool2 = extrude(cut_extrude7_sk2.sketch, amount=-CUT_EXTRUDE7_REACH, mode=Mode.PRIVATE) & cut_extrude7_end
    add(cut_extrude7_tool2.solids().sort_by_distance((16.06969, -19.1, -19.151111))[0], mode=Mode.SUBTRACT)

    # Sketch14 → Boss-Extrude1 (add)
    with BuildSketch(Plane(origin=(0, -19.1, 0), x_dir=(1, 0, 0), z_dir=(0, 1, 0))):
        Polygon((-5.819186048, 18.818103207), (2.060921488, 24.97471796), (2.676582963, 24.186707207), (-5.203524573, 18.030092453), align=None)
        Polygon((-23.943433381, 4.657889274), (-16.063325845, 10.814504028), (-15.44766437, 10.026493274), (-23.327771906, 3.869878521), align=None)
    extrude(amount=BOSS_EXTRUDE1_DEPTH)

    # Chamfer1
    # the kernel refuses this chamfer: 2 mm, written as the material it takes off along each edge
    with BuildSketch(Plane(origin=(-21.92, -23.1, 0), x_dir=(0, 0, 1), z_dir=(-1, 0, 0))) as chamfer1_piece_1:
        Polygon((1.6 + CHAMFER1_SIZE, 0), (1.6, CHAMFER1_SIZE), (1.6, 0), align=None)
    revolve(axis=Axis((-21.92, -23.1, 0), (0, 1, 0)), mode=Mode.SUBTRACT)
    with BuildSketch(Plane(origin=(21.92, -23.1, 0), x_dir=(0, 0, 1), z_dir=(-1, 0, 0))) as chamfer1_piece_2:
        Polygon((1.6 + CHAMFER1_SIZE, 0), (1.6, CHAMFER1_SIZE), (1.6, 0), align=None)
    revolve(axis=Axis((21.92, -23.1, 0), (0, 1, 0)), mode=Mode.SUBTRACT)


solid = part.part
